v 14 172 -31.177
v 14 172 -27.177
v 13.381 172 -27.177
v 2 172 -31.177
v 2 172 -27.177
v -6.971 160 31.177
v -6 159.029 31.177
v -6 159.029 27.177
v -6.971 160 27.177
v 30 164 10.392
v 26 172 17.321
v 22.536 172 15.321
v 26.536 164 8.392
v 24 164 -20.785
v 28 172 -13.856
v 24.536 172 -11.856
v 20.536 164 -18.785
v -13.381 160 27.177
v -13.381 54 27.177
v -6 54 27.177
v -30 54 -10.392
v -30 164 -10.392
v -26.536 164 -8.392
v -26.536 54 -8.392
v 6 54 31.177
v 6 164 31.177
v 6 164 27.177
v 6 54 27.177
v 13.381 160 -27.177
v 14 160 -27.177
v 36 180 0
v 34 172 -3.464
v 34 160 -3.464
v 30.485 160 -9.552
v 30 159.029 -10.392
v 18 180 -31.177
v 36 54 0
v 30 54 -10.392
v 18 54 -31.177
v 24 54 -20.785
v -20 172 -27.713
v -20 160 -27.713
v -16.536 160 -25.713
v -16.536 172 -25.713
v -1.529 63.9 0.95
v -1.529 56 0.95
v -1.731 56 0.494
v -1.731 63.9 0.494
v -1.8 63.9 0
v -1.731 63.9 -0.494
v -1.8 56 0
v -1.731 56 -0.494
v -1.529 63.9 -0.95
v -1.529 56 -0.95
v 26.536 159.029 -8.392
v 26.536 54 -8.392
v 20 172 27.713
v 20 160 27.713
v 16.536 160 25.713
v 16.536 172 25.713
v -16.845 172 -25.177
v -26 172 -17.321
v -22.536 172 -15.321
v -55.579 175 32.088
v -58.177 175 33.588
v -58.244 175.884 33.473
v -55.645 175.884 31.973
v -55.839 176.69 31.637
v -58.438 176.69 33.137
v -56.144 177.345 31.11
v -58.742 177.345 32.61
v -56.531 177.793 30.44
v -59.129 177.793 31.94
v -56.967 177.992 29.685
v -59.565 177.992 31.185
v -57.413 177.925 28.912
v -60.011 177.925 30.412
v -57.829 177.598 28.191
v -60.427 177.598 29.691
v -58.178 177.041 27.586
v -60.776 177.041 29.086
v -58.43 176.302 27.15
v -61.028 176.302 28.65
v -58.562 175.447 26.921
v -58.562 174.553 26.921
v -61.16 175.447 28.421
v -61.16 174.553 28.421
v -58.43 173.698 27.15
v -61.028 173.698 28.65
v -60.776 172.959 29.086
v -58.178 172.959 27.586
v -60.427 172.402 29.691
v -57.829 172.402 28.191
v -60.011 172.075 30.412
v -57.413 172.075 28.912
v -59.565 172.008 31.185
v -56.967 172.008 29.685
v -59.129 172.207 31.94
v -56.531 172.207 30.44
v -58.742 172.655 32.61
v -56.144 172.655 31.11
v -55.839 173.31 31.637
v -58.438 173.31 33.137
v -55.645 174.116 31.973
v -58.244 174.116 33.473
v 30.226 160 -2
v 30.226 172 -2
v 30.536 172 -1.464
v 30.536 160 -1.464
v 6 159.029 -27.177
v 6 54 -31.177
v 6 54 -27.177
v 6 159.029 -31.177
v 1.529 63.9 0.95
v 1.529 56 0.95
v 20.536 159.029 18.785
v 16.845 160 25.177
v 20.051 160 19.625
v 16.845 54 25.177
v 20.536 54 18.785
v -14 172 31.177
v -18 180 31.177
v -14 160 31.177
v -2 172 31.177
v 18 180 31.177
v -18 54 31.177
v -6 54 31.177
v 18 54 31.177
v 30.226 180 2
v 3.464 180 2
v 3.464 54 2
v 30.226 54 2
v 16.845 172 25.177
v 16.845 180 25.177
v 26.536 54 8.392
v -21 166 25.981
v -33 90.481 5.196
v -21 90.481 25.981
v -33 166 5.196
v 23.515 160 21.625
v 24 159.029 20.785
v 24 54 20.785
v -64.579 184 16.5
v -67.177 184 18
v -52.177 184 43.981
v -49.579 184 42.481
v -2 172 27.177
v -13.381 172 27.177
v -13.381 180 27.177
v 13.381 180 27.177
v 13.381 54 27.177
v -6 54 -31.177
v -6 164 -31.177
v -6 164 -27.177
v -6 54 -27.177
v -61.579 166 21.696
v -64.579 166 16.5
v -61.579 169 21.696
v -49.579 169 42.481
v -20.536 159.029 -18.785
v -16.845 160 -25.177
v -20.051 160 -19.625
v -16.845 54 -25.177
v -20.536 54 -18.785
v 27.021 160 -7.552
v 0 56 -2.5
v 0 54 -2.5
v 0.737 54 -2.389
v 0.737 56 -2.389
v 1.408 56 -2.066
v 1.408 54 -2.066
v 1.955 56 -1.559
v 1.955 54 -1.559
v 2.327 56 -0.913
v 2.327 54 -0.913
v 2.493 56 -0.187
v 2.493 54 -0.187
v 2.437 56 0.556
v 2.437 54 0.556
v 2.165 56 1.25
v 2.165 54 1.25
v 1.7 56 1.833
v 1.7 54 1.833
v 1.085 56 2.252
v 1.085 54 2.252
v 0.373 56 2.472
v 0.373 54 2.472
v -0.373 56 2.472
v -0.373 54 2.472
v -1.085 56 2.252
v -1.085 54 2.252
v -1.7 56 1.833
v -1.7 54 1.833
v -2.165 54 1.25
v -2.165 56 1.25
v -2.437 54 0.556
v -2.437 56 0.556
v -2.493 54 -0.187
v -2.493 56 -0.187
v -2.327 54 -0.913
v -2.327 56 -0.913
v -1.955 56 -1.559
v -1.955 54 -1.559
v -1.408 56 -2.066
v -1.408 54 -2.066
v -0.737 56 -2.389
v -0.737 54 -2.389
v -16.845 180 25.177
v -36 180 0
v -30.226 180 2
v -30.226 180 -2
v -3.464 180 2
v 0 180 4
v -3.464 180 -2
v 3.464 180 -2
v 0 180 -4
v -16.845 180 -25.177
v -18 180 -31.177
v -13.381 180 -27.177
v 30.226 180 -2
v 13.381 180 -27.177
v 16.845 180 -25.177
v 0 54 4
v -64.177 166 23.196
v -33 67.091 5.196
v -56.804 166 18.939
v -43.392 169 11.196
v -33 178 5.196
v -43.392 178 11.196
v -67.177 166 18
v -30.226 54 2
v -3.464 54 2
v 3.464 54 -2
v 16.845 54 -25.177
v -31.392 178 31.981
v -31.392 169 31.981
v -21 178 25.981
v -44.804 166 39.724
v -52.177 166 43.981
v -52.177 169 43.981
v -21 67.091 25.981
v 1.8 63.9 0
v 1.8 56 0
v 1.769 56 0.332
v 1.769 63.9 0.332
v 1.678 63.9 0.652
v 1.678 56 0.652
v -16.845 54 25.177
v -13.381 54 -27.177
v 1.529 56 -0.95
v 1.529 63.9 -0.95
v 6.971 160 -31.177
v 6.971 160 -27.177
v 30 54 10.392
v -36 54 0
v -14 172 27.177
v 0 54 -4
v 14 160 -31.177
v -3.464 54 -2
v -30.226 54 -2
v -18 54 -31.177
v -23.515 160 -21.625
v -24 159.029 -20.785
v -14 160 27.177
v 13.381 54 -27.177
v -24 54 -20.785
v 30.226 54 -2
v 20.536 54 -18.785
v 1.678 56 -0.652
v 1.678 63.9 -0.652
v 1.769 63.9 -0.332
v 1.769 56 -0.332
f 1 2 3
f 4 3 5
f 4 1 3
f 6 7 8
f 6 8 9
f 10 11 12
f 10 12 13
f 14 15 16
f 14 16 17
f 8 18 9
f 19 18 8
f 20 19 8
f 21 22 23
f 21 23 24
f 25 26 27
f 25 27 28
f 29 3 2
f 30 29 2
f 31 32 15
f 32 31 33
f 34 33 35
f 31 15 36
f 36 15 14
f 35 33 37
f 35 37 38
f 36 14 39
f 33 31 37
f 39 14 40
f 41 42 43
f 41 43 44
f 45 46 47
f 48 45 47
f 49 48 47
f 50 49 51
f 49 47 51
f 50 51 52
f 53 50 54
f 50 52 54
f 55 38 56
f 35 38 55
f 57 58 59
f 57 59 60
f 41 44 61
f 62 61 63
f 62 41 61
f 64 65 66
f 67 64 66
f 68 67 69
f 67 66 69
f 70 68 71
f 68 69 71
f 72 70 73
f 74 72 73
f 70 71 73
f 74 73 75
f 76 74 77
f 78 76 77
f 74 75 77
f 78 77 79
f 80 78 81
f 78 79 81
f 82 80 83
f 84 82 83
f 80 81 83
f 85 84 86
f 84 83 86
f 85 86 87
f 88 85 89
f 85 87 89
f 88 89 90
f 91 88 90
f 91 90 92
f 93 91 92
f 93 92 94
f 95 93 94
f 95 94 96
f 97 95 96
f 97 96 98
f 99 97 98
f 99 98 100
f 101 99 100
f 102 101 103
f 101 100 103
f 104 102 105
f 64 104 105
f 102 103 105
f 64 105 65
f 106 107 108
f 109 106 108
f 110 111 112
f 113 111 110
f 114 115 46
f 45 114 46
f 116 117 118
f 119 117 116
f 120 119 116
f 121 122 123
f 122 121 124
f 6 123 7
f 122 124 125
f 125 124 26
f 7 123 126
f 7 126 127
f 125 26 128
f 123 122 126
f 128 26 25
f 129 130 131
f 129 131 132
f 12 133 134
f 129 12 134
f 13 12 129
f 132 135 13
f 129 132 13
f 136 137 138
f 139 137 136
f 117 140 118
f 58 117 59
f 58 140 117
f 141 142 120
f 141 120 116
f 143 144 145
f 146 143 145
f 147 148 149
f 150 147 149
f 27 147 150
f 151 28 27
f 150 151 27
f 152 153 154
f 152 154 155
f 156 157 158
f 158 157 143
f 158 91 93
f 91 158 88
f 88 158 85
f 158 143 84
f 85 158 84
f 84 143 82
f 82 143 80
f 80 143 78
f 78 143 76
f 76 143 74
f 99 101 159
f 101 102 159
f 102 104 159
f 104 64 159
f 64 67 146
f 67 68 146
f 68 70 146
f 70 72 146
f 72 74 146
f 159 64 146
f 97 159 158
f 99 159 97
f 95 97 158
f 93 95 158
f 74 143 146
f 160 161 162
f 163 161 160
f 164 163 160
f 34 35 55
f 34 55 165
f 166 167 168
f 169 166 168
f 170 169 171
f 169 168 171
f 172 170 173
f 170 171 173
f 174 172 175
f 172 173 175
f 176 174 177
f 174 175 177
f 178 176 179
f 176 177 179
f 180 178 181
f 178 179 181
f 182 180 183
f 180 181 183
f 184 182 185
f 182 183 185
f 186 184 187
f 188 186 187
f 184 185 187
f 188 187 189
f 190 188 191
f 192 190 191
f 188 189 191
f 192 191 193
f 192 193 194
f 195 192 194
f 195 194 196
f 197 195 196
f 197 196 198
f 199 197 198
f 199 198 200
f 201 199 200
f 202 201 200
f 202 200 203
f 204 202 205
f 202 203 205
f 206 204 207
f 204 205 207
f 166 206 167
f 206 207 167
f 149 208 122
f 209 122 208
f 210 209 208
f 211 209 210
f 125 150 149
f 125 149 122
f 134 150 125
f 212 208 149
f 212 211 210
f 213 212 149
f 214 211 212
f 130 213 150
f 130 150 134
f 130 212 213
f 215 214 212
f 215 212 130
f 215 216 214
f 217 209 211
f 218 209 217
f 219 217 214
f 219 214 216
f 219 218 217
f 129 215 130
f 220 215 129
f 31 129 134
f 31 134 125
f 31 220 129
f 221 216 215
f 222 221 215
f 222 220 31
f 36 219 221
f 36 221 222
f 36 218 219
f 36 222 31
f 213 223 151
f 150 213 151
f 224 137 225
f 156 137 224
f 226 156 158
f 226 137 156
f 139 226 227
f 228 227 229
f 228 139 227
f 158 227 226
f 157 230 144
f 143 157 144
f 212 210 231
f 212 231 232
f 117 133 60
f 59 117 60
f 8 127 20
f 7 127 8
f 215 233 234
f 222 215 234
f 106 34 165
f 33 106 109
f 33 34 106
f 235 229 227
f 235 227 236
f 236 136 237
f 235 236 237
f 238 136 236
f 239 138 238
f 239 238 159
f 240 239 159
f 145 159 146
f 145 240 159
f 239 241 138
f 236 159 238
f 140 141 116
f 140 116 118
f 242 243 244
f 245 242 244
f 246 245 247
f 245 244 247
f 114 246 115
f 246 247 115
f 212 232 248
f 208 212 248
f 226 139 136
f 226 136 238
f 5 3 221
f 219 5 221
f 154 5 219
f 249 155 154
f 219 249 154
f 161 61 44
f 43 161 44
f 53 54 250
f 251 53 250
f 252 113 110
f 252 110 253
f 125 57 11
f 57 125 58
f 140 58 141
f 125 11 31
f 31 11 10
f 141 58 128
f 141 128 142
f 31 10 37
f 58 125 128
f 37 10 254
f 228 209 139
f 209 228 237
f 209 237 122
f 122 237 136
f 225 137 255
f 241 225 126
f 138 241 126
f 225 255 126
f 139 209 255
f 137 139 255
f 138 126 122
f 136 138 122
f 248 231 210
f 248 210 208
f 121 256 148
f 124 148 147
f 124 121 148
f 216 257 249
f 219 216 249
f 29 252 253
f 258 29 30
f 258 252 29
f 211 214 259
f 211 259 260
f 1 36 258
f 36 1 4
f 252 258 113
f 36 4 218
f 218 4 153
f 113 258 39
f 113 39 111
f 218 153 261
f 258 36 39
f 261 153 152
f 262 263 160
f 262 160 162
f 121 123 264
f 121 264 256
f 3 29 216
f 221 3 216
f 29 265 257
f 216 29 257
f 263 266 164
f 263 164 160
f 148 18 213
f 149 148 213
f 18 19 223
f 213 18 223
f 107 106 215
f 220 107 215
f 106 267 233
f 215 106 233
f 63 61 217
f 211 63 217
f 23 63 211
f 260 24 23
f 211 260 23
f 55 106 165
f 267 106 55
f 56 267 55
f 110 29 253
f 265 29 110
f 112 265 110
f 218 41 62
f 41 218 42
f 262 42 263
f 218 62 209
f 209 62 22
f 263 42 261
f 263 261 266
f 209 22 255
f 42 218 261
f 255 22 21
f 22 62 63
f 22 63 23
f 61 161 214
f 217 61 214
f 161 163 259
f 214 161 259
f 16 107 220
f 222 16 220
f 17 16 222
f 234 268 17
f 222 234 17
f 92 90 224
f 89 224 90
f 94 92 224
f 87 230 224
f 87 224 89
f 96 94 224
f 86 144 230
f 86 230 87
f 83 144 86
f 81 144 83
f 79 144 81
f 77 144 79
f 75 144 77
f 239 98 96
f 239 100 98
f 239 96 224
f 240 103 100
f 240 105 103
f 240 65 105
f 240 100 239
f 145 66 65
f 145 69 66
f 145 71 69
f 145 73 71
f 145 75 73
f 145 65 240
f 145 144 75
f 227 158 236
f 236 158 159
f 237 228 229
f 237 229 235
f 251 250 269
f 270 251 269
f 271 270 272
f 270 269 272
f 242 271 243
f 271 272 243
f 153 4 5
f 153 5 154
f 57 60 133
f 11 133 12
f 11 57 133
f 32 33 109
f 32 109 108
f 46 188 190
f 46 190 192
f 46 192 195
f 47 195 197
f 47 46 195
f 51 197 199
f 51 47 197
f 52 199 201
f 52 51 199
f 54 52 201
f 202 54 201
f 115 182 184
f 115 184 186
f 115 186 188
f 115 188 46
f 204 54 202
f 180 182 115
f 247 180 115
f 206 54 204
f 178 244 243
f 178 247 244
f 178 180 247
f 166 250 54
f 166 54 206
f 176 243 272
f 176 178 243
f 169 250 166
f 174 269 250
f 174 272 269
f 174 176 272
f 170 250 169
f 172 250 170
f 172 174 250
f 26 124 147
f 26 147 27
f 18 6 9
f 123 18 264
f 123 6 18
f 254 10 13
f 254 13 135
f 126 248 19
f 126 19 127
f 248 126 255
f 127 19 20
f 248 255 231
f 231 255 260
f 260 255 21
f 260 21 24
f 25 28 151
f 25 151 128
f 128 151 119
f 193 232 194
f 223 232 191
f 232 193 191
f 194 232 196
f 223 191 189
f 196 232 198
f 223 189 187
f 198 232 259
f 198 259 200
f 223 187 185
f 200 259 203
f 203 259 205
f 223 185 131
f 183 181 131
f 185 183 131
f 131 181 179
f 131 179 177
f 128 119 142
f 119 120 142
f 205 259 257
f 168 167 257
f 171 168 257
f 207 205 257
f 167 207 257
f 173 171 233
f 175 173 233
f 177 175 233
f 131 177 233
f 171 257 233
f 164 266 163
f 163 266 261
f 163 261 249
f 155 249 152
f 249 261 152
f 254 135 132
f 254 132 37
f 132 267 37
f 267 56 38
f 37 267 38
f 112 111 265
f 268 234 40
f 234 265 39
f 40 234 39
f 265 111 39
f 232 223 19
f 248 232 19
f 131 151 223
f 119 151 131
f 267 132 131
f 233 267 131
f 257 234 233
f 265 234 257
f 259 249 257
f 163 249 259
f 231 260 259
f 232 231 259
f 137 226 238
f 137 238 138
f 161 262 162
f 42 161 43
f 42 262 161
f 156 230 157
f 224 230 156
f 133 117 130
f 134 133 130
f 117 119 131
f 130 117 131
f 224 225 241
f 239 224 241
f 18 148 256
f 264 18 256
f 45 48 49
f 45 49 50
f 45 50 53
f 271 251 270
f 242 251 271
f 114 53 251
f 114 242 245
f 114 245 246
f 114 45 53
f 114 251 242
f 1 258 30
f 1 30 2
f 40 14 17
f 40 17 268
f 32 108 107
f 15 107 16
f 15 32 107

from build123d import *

# Parameters (mm, degrees)
SALIENTE_EXTRUIR1_DEPTH = 10
SALIENTE_EXTRUIR2_DEPTH = 170
CORTAR_EXTRUIR1_DEPTH   = 4
MATRIZC1_COUNT          = 5
MATRIZC1_ANGLE          = 240
CROQUIS4_W              = 24
CROQUIS4_H              = 12
SALIENTE_EXTRUIR3_DEPTH = 36
CROQUIS5_W              = 24
CROQUIS5_H              = 9
CORTAR_EXTRUIR2_DEPTH   = 24
CHAFL_N1_SIZE2          = 36
CHAFL_N1_SIZE           = 98.9091871
CORTAR_EXTRUIR3_DEPTH   = 24
CROQUIS7_W              = 30
CROQUIS7_H              = 18
CROQUIS7_R              = 3
SALIENTE_EXTRUIR4_DEPTH = 3
CROQUIS8_W              = 250
CROQUIS8_H              = 250
CORTAR_EXTRUIR4_DEPTH   = 84
CROQUIS9_R              = 2.5
CORTAR_EXTRUIR5_DEPTH   = 2
CORTAR_EXTRUIR6_DEPTH   = 7.9


with BuildPart() as part:
    # Croquis1 → Saliente-Extruir1 (new body)
    with BuildSketch(Plane(origin=(0, 0, 0), x_dir=(1, 0, 0), z_dir=(0, 1, 0))):
        Polygon((-12, 51.961524227), (-30, 51.961524227), (-39, 36.373066959), (-27, 15.588457268), (-51, 15.588457268), (-60, 0), (-51, -15.588457268), (-27, -15.588457268), (-39, -36.373066959), (-30, -51.961524227), (-12, -51.961524227), (0, -31.176914536), (12, -51.961524227), (30, -51.961524227), (39, -36.373066959), (27, -15.588457268), (51, -15.588457268), (60, 0), (51, 15.588457268), (27, 15.588457268), (39, 36.373066959), (30, 51.961524227), (12, 51.961524227), (0, 31.176914536), align=None)
    extrude(amount=SALIENTE_EXTRUIR1_DEPTH)

    # Croquis2 → Saliente-Extruir2 (add)
    # profile 1 of 2: a face of its own
    with BuildSketch(Plane(origin=(0, 10, 0), x_dir=(1, 0, 0), z_dir=(0, 1, 0))):
        Polygon((36, 0), (18, 31.176914536), (-18, 31.176914536), (-36, 0), (-18, -31.176914536), (18, -31.176914536), align=None)
        Polygon((15.690598923, 27.176914536), (-15.690598923, 27.176914536), (-31.381197846, 0), (-15.690598923, -27.176914536), (15.690598923, -27.176914536), (31.381197846, 0), align=None, mode=Mode.SUBTRACT)
    # profile 2 of 2: a face of its own
    with BuildSketch(Plane(origin=(0, 10, 0), x_dir=(1, 0, 0), z_dir=(0, 1, 0))):
        Polygon((-13.381197846, 27.176914536), (-15.690598923, 27.176914536), (-16.845299462, 25.176914536), (-3.464101615, 2), (-30.226497308, 2), (-31.381197846, 0), (-30.226497308, -2), (-3.464101615, -2), (-16.845299462, -25.176914536), (-15.690598923, -27.176914536), (-13.381197846, -27.176914536), (0, -4), (13.381197846, -27.176914536), (15.690598923, -27.176914536), (16.845299462, -25.176914536), (3.464101615, -2), (30.226497308, -2), (31.381197846, 0), (30.226497308, 2), (3.464101615, 2), (16.845299462, 25.176914536), (15.690598923, 27.176914536), (13.381197846, 27.176914536), (0, 4), align=None)
    extrude(amount=SALIENTE_EXTRUIR2_DEPTH)

    # Croquis3 → Cortar-Extruir1 (cut)
    with BuildSketch(Plane.XY.offset(31.176914536)):
        Polygon((-14, 172), (-2, 172), (6, 164), (6, 44), (-6, 44), (-6, 159.029437252), (-6.970562748, 160), (-14, 160), align=None)
    cortar_extruir1 = extrude(amount=-CORTAR_EXTRUIR1_DEPTH, mode=Mode.SUBTRACT)

    # MatrizC1: Cortar-Extruir1 ×5 about axis
    matrizc1_axis = Axis((0, 0, 0), (0, 1, 0))
    for i in range(1, MATRIZC1_COUNT):
        add(cortar_extruir1.rotate(matrizc1_axis, i * MATRIZC1_ANGLE / (MATRIZC1_COUNT - 1)), mode=Mode.SUBTRACT)

    # Croquis4 → Saliente-Extruir3 (add)
    with BuildSketch(Plane(origin=(-27, 0, 15.588457268), x_dir=(0.5000000000000002, 0, 0.8660254037844386), z_dir=(-0.8660254037844386, 0, 0.5000000000000002))):
        with Locations((0, 172)):
            Rectangle(CROQUIS4_W, CROQUIS4_H)
    extrude(amount=SALIENTE_EXTRUIR3_DEPTH)

    # Croquis5 → Cortar-Extruir2 (cut)
    with BuildSketch(Plane(origin=(-58.176914536, 0, 33.588457268), x_dir=(0.5000000000000003, 0, 0.8660254037844386), z_dir=(-0.8660254037844385, 0, 0.5000000000000002))):
        with Locations((0, 173.5)):
            Rectangle(CROQUIS5_W, CROQUIS5_H)
    extrude(amount=-CORTAR_EXTRUIR2_DEPTH, mode=Mode.SUBTRACT)

    # Chaflán1
    chafl_n1_edges = [part.edges().sort_by_distance(p)[0] for p in [
        (-27, 166, 15.588457268),
    ]]
    chafl_n1_side = [part.faces().sort_by_distance(p)[0] for p in [
        (-27, 165.28, 15.588457268),
    ]]
    chamfer(chafl_n1_edges, length=CHAFL_N1_SIZE - 0.0001, length2=CHAFL_N1_SIZE2 - 0.0001, reference=chafl_n1_side[0])  # a hair under: the kernel refuses the full size

    # Croquis6 → Cortar-Extruir3 (cut)
    with BuildSketch(Plane(origin=(-6, 0, -10.392304845), x_dir=(-0.8660254037844385, 0, 0.5000000000000003), z_dir=(-0.5000000000000003, 0, -0.8660254037844385))):
        Polygon((58.663492356, 166), (31.176914536, 90.481248101), (31.176914536, 166), align=None)
    extrude(amount=-CORTAR_EXTRUIR3_DEPTH, mode=Mode.SUBTRACT)

    # Croquis7 → Saliente-Extruir4 (add)
    with BuildSketch(Plane(origin=(-58.176914536, 0, 33.588457268), x_dir=(0.5000000000000003, 0, 0.8660254037844386), z_dir=(-0.8660254037844385, 0, 0.5000000000000002))):
        with Locations((-3, 175)):
            Rectangle(CROQUIS7_W, CROQUIS7_H)
        with Locations((-3, 175)):
            Circle(CROQUIS7_R, mode=Mode.SUBTRACT)
    extrude(amount=-SALIENTE_EXTRUIR4_DEPTH)

    # Croquis8 → Cortar-Extruir4 (cut)
    with BuildSketch(Plane(origin=(0, 54, 0), x_dir=(1, 0, 0), z_dir=(0, 1, 0))):
        Rectangle(CROQUIS8_W, CROQUIS8_H)
    extrude(amount=-CORTAR_EXTRUIR4_DEPTH, mode=Mode.SUBTRACT)

    # Croquis9 → Cortar-Extruir5 (cut)
    with BuildSketch(Plane.XZ.offset(-54)):
        with Locations(Location((0, 0, 0), (0, 0, 270))):
            Circle(CROQUIS9_R)
    extrude(amount=-CORTAR_EXTRUIR5_DEPTH, mode=Mode.SUBTRACT)

    # Croquis10 → Cortar-Extruir6 (cut)
    with BuildSketch(Plane.XZ.offset(-56)):
        with BuildLine():
            Line((1.528888485, 0.95), (-1.528888485, 0.95))
            ThreePointArc((-1.528888485, 0.95), (-1.8, 0), (-1.528888485, -0.95))
            Line((-1.528888485, -0.95), (1.528888485, -0.95))
            ThreePointArc((1.528888485, -0.95), (1.730895617, -0.493963929), (1.8, 0))
            ThreePointArc((1.8, 0), (1.730895617, 0.493963929), (1.528888485, 0.95))
        make_face()
    extrude(amount=-CORTAR_EXTRUIR6_DEPTH, mode=Mode.SUBTRACT)


solid = part.part
